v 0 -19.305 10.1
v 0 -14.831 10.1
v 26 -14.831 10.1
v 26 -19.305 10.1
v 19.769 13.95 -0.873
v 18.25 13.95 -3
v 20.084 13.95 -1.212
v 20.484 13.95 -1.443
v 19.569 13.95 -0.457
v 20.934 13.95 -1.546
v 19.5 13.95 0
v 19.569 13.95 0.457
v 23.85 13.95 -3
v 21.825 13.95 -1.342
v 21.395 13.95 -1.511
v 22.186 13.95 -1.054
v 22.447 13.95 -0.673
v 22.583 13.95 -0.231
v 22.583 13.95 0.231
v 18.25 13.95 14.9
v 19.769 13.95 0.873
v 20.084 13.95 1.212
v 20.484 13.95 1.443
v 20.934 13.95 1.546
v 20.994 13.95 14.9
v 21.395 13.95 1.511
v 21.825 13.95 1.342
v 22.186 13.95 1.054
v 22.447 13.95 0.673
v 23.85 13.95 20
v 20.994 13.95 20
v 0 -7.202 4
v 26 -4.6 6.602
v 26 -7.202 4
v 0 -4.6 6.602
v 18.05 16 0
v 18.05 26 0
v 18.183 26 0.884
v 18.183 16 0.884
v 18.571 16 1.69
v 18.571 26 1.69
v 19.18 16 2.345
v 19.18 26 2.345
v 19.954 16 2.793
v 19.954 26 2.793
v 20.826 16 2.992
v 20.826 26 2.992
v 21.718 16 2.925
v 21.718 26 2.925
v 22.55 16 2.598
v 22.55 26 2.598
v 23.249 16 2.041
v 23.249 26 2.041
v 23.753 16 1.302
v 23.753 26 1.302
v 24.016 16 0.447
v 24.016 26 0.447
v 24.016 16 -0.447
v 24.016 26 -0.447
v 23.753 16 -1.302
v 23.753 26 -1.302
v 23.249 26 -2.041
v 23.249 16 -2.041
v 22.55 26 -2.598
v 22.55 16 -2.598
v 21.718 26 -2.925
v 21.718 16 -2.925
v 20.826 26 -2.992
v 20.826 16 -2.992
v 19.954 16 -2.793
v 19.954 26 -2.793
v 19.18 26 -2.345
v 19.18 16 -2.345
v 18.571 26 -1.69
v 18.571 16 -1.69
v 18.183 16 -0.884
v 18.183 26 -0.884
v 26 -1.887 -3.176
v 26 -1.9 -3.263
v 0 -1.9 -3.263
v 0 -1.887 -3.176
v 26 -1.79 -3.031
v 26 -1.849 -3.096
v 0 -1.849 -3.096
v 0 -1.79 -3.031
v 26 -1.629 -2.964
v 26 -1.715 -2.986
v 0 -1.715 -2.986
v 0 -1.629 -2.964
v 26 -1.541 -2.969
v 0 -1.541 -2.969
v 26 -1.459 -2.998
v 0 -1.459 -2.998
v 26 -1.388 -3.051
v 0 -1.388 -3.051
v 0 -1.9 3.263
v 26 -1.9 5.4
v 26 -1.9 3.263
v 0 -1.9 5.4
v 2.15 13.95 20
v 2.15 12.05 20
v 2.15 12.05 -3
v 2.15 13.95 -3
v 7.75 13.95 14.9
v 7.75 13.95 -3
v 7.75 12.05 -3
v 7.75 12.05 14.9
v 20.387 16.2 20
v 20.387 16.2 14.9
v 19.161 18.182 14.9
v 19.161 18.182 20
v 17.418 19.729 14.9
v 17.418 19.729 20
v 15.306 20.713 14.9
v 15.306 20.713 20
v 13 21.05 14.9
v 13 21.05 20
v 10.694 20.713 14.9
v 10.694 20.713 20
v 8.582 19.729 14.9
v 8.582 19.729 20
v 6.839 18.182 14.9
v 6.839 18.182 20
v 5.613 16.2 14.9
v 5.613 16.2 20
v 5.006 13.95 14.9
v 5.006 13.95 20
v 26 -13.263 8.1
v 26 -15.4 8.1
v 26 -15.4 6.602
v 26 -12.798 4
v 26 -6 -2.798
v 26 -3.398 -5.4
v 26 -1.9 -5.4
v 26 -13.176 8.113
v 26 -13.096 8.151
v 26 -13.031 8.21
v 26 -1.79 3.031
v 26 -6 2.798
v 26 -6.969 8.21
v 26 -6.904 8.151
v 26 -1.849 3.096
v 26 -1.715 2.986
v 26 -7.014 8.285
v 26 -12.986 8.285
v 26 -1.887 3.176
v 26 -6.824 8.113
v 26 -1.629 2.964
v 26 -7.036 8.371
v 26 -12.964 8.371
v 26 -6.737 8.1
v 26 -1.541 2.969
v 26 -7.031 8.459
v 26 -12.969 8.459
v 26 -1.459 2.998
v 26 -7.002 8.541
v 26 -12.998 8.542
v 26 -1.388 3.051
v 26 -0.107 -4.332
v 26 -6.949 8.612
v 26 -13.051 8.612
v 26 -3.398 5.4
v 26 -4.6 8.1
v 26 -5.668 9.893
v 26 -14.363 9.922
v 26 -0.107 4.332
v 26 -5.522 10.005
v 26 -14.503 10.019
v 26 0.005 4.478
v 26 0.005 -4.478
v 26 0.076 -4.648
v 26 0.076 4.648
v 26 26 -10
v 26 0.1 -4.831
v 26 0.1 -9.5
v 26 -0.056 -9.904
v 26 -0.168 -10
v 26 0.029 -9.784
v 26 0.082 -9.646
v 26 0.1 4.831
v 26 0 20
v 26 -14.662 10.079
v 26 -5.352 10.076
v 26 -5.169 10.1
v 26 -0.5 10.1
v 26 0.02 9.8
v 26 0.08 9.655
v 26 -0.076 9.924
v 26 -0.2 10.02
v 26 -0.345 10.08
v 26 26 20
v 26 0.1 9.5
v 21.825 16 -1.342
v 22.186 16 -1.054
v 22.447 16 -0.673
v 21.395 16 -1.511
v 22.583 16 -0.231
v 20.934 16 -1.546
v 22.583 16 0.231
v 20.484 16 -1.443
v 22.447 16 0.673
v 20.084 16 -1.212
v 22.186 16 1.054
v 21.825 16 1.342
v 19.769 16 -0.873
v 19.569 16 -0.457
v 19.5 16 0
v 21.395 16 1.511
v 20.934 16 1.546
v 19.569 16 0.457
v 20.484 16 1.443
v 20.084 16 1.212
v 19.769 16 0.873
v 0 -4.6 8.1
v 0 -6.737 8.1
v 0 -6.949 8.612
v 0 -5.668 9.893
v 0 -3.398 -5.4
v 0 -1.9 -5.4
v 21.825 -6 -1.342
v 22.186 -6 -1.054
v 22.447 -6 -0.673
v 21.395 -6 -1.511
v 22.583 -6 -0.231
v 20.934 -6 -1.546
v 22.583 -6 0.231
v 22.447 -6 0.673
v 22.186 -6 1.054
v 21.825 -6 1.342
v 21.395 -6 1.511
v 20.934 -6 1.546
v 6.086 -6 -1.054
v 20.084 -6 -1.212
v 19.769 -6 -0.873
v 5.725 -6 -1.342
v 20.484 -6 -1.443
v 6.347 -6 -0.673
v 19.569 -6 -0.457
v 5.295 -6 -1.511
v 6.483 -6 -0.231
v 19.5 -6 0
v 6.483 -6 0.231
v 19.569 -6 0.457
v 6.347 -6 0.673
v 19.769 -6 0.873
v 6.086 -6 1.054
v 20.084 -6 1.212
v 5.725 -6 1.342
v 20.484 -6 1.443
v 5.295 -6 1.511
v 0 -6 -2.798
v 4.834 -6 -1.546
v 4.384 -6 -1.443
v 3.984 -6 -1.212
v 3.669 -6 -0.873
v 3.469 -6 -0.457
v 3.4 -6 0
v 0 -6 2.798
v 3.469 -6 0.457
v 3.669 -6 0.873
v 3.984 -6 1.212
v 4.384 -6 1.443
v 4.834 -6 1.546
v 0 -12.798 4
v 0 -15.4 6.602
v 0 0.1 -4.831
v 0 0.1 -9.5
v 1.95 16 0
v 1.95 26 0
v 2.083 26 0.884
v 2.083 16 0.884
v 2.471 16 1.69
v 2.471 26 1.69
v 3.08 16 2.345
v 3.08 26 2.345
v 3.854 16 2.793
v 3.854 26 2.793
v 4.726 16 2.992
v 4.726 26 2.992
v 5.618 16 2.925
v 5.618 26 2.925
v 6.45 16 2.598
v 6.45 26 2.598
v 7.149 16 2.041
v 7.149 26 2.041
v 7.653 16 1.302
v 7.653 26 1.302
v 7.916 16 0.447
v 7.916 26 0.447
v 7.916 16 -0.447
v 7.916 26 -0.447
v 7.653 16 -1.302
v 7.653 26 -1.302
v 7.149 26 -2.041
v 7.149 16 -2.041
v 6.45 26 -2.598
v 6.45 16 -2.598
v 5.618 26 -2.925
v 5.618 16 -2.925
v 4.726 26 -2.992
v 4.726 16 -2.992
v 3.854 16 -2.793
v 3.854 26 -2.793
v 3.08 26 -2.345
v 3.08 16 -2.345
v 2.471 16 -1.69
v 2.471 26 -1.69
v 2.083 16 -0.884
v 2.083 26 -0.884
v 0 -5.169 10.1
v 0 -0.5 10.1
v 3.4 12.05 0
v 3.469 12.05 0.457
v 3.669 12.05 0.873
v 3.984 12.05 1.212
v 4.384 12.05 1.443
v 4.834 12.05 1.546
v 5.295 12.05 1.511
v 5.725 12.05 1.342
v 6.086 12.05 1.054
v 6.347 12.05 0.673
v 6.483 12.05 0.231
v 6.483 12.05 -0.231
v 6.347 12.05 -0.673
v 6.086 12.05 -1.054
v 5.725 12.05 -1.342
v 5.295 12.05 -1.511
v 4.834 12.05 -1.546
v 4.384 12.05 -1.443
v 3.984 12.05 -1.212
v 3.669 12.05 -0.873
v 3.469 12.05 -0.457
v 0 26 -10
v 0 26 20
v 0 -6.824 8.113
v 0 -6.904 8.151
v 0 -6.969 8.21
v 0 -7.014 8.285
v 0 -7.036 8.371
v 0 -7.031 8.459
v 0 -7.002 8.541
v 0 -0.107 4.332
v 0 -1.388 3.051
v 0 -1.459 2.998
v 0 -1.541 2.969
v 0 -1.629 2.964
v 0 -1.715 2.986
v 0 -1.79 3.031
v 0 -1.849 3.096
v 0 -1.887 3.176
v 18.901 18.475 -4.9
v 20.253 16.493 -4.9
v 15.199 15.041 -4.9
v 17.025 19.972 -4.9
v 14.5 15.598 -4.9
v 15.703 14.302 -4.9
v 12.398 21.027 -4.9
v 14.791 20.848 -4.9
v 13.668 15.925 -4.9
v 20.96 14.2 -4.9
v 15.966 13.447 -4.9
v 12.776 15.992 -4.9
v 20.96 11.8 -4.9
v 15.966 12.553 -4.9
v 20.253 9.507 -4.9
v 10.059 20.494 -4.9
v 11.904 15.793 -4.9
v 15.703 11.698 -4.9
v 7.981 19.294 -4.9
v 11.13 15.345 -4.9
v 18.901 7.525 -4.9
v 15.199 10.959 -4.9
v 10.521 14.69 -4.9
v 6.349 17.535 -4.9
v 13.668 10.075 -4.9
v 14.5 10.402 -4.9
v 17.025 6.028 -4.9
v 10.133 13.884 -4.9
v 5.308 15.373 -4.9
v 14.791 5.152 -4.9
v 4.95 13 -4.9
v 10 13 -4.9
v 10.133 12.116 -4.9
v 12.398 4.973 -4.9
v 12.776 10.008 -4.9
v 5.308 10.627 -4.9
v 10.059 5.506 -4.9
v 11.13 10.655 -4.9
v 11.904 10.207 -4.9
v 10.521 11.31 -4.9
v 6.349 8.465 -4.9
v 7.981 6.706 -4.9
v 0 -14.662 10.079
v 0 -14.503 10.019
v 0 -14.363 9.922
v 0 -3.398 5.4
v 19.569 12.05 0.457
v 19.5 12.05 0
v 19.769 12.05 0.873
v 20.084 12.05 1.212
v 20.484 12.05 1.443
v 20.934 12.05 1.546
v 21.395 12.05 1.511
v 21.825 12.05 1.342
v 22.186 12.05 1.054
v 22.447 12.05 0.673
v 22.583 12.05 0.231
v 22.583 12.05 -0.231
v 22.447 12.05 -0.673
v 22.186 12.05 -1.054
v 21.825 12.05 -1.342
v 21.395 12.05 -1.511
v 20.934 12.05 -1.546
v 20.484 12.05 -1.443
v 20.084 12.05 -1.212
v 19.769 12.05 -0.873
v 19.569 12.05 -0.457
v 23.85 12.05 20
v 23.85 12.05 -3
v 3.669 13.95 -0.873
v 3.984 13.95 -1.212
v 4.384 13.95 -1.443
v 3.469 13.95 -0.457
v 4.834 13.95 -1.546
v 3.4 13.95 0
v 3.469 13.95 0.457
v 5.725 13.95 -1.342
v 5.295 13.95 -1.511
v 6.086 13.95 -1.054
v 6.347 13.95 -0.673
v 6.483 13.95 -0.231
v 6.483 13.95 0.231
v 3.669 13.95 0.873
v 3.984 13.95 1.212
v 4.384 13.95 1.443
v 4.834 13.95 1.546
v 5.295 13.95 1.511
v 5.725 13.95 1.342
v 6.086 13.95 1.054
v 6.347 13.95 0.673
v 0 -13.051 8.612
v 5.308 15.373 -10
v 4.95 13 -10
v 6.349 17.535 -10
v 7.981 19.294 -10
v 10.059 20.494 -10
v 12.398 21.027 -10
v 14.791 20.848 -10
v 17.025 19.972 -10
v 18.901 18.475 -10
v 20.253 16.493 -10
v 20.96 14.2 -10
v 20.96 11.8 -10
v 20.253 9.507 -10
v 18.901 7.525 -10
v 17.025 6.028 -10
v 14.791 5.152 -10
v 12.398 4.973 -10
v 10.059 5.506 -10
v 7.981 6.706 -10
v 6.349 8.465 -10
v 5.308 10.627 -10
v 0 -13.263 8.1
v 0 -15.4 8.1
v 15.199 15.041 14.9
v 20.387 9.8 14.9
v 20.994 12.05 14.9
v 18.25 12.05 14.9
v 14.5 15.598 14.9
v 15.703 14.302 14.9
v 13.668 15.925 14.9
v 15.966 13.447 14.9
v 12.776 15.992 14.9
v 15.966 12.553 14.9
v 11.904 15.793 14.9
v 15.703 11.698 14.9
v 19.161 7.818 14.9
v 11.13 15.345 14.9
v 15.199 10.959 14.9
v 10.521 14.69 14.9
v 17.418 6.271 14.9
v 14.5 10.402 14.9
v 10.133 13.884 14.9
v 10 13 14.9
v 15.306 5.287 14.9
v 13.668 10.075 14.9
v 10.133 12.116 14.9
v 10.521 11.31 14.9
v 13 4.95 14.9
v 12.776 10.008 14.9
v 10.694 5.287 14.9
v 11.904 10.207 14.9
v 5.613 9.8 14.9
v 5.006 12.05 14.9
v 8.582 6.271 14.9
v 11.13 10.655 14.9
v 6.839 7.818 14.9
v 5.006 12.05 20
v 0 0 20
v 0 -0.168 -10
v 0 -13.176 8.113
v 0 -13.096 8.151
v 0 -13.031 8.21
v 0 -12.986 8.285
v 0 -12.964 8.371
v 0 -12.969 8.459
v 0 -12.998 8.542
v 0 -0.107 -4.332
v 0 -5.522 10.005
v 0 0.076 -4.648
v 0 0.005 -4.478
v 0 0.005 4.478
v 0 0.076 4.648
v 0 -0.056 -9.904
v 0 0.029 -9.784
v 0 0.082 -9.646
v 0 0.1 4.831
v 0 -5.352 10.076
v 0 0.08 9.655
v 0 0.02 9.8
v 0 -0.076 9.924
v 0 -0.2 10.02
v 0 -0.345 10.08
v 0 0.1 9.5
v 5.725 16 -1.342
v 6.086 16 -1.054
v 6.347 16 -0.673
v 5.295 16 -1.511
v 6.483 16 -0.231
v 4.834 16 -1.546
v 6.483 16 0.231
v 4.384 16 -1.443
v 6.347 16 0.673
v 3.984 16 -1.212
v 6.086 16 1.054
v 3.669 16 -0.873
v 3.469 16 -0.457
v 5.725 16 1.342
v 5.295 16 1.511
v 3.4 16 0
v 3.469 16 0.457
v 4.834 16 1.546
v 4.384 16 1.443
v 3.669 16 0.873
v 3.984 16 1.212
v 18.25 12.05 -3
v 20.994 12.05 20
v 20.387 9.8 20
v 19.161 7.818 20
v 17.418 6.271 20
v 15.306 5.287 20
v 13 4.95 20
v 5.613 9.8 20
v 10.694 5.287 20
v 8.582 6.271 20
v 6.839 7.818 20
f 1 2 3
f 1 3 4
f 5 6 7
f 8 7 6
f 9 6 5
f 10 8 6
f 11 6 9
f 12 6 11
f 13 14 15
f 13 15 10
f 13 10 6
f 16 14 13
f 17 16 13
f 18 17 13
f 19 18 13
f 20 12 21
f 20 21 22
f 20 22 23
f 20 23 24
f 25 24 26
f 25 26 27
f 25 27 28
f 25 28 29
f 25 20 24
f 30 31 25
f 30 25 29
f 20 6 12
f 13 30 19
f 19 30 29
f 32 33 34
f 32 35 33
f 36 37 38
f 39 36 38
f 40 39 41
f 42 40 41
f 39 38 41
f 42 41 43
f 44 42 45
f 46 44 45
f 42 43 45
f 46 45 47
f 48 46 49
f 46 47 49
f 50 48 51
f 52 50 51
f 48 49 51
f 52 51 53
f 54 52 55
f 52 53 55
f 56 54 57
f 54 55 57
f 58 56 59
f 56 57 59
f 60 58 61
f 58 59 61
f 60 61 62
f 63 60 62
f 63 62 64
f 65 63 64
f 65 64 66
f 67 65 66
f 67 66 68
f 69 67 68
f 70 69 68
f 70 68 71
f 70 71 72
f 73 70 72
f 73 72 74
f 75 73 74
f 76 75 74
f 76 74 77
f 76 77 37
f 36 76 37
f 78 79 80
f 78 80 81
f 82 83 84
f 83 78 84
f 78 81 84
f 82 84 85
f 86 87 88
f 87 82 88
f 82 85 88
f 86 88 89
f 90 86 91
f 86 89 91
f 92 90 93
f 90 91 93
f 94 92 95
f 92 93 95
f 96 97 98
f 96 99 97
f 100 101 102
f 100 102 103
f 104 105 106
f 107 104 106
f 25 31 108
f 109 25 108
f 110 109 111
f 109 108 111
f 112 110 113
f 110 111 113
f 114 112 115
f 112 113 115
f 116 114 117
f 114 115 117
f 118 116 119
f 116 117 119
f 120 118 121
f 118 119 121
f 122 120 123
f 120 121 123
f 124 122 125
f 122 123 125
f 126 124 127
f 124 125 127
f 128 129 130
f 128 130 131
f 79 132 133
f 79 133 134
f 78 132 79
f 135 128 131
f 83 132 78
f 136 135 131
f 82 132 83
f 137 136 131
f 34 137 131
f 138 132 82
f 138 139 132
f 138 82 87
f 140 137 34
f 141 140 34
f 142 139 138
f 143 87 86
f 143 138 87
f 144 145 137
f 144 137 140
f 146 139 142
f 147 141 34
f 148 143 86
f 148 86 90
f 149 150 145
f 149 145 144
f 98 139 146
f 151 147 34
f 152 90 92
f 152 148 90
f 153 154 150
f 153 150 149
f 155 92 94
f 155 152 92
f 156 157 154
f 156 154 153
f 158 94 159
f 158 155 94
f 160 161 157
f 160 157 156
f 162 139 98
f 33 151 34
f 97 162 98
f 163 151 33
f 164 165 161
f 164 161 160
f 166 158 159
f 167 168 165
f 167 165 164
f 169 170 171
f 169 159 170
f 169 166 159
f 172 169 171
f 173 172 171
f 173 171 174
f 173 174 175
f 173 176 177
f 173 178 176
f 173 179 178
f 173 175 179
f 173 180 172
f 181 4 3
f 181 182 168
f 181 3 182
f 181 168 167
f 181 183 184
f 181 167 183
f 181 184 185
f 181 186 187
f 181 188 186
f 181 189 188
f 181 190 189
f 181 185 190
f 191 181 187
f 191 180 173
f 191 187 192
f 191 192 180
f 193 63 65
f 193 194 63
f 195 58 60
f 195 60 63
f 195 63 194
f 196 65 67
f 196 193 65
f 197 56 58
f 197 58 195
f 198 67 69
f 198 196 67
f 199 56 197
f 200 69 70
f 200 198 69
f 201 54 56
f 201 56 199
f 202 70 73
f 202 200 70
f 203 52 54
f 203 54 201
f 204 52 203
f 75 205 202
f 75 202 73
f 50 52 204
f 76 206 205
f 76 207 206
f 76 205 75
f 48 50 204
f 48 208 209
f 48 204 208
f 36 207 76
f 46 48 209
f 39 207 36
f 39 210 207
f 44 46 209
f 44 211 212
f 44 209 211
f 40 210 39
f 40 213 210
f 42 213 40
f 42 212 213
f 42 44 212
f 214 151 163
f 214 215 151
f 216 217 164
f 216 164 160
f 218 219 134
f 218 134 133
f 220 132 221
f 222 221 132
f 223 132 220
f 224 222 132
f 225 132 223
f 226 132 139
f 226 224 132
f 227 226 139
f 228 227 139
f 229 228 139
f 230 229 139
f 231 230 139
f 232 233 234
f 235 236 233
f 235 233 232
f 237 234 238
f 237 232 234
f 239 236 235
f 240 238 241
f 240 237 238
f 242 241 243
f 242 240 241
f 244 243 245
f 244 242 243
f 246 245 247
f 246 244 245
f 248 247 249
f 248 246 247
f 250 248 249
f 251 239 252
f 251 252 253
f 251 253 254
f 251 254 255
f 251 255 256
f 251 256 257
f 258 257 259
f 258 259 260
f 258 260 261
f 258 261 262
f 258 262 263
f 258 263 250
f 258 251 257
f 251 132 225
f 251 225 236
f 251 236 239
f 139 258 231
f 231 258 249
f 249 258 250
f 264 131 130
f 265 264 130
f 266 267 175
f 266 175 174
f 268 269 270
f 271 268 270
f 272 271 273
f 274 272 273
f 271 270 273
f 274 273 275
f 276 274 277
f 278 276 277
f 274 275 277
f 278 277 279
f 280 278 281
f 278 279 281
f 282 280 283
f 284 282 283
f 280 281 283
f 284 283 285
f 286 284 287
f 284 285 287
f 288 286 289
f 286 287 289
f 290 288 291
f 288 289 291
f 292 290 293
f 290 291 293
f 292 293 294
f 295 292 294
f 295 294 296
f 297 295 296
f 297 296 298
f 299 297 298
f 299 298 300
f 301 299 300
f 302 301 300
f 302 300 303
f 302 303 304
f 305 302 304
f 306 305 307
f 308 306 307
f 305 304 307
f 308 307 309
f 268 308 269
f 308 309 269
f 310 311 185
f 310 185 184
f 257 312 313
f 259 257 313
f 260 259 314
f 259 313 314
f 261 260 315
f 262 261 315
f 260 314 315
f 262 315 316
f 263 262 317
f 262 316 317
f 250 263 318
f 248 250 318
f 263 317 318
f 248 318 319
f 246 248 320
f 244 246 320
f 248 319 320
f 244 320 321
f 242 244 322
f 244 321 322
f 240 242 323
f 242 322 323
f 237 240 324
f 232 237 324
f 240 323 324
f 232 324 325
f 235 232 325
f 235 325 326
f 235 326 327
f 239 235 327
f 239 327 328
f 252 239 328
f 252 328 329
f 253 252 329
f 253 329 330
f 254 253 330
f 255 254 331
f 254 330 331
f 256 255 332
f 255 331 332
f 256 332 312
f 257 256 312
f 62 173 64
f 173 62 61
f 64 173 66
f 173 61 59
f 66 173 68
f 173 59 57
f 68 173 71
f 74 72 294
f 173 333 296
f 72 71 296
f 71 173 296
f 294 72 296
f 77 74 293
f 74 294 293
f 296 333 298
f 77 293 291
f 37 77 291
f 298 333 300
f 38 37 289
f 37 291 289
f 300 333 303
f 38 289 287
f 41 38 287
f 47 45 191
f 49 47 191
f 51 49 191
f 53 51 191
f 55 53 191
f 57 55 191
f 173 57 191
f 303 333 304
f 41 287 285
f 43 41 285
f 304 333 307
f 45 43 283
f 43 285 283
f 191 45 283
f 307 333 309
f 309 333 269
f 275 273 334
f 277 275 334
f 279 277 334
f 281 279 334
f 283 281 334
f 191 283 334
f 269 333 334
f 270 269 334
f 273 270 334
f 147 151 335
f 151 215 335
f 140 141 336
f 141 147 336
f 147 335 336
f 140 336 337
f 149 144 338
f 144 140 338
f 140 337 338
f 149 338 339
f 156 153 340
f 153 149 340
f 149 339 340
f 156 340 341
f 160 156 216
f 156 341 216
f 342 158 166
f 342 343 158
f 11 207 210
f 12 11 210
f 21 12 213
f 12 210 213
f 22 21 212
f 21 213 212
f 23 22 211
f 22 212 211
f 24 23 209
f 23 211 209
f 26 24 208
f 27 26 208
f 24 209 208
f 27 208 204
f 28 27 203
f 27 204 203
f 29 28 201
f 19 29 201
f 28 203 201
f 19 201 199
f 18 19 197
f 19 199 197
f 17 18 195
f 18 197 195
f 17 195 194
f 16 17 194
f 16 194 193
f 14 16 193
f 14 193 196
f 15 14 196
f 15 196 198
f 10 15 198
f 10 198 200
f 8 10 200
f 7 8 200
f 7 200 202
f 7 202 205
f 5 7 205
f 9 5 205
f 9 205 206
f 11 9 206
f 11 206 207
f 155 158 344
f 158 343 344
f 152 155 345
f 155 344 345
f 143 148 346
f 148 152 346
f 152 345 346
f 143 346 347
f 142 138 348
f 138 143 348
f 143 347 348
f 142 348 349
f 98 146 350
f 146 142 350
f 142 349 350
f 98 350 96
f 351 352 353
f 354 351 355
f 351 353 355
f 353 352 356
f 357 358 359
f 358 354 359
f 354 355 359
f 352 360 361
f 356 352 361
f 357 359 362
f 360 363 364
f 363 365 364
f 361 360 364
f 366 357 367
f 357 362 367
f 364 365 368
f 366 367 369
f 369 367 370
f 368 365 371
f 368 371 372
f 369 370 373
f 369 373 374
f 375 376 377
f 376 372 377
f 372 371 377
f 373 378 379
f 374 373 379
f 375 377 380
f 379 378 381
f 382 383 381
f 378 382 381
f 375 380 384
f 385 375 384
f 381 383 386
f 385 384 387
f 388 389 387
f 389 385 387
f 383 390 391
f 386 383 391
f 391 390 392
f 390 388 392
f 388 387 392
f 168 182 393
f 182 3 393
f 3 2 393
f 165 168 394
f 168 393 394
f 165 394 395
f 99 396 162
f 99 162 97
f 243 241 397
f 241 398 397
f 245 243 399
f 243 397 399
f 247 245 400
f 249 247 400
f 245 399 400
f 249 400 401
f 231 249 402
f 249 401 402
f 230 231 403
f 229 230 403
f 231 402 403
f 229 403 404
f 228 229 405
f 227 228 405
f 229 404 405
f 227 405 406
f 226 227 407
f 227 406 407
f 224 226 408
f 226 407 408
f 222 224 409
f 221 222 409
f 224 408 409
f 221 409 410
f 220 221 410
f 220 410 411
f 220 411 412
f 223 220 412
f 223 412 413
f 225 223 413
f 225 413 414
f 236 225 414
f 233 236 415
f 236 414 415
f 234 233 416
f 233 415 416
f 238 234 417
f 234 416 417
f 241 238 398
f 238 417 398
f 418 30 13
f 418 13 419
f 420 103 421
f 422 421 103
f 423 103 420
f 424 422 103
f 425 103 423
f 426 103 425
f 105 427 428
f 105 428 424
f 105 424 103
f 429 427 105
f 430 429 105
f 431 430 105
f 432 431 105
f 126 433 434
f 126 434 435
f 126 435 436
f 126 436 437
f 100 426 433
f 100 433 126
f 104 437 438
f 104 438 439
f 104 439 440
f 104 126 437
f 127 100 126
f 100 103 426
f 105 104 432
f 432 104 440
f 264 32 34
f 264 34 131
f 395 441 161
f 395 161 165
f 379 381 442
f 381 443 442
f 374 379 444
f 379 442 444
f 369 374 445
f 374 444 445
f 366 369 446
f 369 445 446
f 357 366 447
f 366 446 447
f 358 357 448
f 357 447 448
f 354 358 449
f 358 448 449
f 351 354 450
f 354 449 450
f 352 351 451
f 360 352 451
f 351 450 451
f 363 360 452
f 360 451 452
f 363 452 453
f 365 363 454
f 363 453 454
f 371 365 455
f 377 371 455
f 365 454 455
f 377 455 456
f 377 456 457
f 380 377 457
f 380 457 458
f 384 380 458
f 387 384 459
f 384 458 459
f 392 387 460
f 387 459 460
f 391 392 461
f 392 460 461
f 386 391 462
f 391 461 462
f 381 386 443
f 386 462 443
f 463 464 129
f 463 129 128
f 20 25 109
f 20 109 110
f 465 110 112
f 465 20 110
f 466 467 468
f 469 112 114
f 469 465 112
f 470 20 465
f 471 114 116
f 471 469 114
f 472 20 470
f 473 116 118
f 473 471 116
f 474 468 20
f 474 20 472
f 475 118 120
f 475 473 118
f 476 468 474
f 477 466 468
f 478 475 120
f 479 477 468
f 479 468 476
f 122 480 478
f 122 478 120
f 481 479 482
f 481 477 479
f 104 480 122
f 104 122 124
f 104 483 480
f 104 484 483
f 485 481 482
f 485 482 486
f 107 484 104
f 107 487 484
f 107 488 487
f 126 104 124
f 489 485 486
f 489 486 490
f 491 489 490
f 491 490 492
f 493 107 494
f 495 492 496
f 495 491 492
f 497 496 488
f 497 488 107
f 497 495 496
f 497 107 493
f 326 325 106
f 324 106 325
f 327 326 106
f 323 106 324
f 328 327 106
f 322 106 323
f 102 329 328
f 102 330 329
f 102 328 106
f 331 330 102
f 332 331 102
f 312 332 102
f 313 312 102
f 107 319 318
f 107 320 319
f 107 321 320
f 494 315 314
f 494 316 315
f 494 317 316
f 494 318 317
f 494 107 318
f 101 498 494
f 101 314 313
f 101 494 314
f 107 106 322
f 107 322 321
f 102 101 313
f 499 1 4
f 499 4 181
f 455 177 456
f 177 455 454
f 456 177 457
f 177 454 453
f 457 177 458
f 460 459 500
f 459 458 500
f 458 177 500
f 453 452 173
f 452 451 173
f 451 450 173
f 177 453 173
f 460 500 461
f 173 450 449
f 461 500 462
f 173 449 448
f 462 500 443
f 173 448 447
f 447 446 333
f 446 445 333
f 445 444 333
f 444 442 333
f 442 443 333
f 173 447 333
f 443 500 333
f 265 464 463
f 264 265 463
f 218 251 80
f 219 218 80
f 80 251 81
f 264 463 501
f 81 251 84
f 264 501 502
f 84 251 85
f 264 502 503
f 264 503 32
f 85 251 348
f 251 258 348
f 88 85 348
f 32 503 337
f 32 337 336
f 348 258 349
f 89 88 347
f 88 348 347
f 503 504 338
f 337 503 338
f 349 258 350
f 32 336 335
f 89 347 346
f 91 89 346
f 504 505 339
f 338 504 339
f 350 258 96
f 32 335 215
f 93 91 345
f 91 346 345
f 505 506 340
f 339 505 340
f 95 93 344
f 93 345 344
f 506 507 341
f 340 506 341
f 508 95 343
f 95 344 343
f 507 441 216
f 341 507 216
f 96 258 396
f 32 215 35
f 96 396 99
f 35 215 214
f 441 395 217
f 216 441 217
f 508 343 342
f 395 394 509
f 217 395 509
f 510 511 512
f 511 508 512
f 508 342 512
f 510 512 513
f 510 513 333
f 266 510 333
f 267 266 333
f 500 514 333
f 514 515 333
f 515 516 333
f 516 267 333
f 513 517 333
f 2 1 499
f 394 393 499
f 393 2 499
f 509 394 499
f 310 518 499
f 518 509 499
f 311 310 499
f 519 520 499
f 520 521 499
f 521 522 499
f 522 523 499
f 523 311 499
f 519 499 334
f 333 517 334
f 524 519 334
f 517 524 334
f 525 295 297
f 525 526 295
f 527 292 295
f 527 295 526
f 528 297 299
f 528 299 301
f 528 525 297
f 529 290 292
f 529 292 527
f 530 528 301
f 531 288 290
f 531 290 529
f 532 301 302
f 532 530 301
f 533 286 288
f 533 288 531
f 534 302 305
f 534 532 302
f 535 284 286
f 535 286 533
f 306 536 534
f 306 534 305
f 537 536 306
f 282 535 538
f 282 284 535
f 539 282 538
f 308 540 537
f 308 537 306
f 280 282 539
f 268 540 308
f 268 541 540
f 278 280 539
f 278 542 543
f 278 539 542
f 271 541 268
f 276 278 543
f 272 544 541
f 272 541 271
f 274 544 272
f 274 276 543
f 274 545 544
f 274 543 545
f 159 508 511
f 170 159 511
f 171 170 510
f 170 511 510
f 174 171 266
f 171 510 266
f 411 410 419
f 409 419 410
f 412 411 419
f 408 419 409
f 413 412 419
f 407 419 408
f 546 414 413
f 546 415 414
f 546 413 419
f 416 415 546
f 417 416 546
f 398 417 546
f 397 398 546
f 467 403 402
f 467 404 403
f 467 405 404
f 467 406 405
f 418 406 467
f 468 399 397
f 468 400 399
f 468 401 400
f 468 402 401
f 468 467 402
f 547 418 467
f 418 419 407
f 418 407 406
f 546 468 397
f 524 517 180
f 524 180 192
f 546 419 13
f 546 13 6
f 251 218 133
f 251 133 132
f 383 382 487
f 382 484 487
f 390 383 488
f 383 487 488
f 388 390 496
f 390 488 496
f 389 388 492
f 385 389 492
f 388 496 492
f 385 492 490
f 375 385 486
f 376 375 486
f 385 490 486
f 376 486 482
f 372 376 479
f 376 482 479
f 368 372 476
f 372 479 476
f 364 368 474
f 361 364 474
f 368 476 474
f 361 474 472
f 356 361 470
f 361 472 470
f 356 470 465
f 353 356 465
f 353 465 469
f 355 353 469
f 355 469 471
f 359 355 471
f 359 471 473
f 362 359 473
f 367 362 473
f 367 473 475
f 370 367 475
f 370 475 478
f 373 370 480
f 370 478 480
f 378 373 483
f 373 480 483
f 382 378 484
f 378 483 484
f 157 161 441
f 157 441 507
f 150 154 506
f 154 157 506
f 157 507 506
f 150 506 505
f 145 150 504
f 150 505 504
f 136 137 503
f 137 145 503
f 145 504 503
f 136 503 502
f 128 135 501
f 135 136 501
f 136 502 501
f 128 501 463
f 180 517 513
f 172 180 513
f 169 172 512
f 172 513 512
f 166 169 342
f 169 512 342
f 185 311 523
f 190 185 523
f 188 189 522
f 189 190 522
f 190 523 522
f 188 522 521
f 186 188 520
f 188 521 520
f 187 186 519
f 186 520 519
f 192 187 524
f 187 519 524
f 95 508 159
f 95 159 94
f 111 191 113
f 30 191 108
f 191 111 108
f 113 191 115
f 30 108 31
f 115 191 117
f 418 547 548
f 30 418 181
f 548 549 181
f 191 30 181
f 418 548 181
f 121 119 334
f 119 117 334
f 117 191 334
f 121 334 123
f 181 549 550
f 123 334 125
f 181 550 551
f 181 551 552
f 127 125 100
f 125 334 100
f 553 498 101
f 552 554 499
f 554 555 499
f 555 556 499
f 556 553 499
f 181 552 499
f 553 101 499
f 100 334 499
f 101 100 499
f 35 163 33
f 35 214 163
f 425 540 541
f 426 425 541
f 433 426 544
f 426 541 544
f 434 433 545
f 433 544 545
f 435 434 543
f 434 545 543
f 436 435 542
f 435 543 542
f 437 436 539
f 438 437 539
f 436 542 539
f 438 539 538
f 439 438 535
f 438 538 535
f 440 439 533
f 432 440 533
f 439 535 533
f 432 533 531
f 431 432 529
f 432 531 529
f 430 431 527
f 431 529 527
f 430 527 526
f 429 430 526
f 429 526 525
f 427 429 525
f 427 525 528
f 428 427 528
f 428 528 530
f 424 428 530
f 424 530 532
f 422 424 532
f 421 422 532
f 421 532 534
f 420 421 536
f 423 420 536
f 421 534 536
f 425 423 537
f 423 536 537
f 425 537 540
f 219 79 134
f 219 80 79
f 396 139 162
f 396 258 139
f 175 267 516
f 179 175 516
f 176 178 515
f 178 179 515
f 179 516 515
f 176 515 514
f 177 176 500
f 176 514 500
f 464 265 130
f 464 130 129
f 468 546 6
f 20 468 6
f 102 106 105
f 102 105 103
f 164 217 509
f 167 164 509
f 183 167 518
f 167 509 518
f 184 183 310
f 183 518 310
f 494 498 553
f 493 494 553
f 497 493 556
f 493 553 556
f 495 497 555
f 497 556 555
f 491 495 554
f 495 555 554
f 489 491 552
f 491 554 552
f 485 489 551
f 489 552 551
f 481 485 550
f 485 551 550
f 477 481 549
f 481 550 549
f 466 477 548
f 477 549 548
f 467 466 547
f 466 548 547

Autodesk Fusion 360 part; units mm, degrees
sketch "Sketch1" plane through (0, 0, 0) normal (1, 0, 0) x (0, 1, 0)
  line L0 (-3.4393, 5.5) -> (-1.8, 5.5)
  line L1 (-12.8393, 3.9) -> (-15.5, 6.5607)
  line L2 (-7.1607, 3.9) -> (-12.8393, 3.9)
  line L3 (-4.5, 6.5607) -> (-7.1607, 3.9)
  line L4 (-4.5, -8.2) -> (-6.7372, -8.2)
  line L5 (-5.5978, 9.8222) -> (-6.8786, 8.5414)
  line L6 (-1.8, 5.5) -> (-1.8, 3.2628)
  line L7 (-19.8494, 4.4312) -> (-18.5414, 3.1214)
  line L8 (-15.5, 8.2) -> (-13.2628, 8.2)
  arc A0 (-5.1686, 10) -> (-5.5978, 9.8222) centre (-5.1686, 9.3929) ccw
  circle A1 centre (-10, 0) radius 2.1
  line L9 (-0.5, 10) -> (-5.1686, 10)
  line L10 (-6.1, 2.8393) -> (-3.4393, 5.5)
  line L11 (-14.8314, 10) -> (-19.5, 10)
  line L12 (0, -9.5) -> (0, -4.8314)
  line L13 (-15.5, -8.2) -> (-15.5, -6.5607)
  line L14 (-15.5, -6.5607) -> (-12.8393, -3.9)
  line L15 (-14.4022, -9.8222) -> (-13.1214, -8.5414)
  line L16 (-19.9987, -4.7917) -> (-20, -9.5)
  line L17 (-18.5414, -3.1214) -> (-19.8222, -4.4022)
  line L18 (-6.8786, -8.5414) -> (-5.7664, -9.6536)
  arc A2 (-19.8222, -4.4022) -> (-19.9987, -4.7917) centre (-19.3929, -4.8314) ccw
  line L19 (-13.9, -2.8393) -> (-16.5607, -5.5)
  line L20 (-16.5607, -5.5) -> (-18.2, -5.5)
  arc A3 (-0.5, -10) -> (0, -9.5) centre (-0.5, -9.5) ccw
  arc A4 (-18.2, -3.2628) -> (-18.5414, -3.1214) centre (-18.4, -3.2628) ccw
  line L21 (-13.2628, -8.2) -> (-15.5, -8.2)
  line L22 (-0.1778, -4.4022) -> (-1.4586, -3.1214)
  arc A5 (-5.7664, -9.6536) -> (-5.1686, -10) centre (-5.1163, -9.2207) ccw
  arc A6 (-20, -9.5) -> (-19.5, -10) centre (-19.5, -9.5) ccw
  line L23 (-1.8, -5.5) -> (-3.4393, -5.5)
  line L24 (-5.1686, -10) -> (-0.5, -10)
  line L25 (-3.4393, -5.5) -> (-6.1, -2.8393)
  line L26 (-12.8393, -3.9) -> (-7.1607, -3.9)
  line L27 (-4.5, -6.5607) -> (-4.5, -8.2)
  arc A7 (0, -4.8314) -> (-0.1778, -4.4022) centre (-0.6071, -4.8314) ccw
  arc A8 (-14.8314, -10) -> (-14.4022, -9.8222) centre (-14.8314, -9.3929) ccw
  line L28 (-18.2, -5.5) -> (-18.2, -3.2628)
  arc A9 (-13.1214, -8.5414) -> (-13.2628, -8.2) centre (-13.2628, -8.4) ccw
  arc A10 (-20, 4.9) -> (-19.8494, 4.4312) centre (-19.3734, 4.8428) ccw
  arc A11 (-13.2628, 8.2) -> (-13.1214, 8.5414) centre (-13.2628, 8.4) ccw
  line L29 (-13.1214, 8.5414) -> (-14.4312, 9.8494)
  arc A12 (-6.8786, 8.5414) -> (-6.7372, 8.2) centre (-6.7372, 8.4) ccw
  arc A13 (-18.5414, 3.1214) -> (-18.2, 3.2628) centre (-18.4, 3.2628) ccw
  arc A14 (-14.4312, 9.8494) -> (-14.8314, 10) centre (-14.8314, 9.3929) ccw
  line L30 (-1.4586, 3.1214) -> (-0.1778, 4.4022)
  line L31 (-15.5, 6.5607) -> (-15.5, 8.2)
  arc A15 (-19.5, 10) -> (-20, 9.5) centre (-19.5, 9.5) ccw
  arc A16 (0, 9.5) -> (-0.5, 10) centre (-0.5, 9.5) ccw
  line L32 (-20, 9.5) -> (-20, 4.9)
  line L33 (-19.5, -10) -> (-14.8314, -10)
  line L34 (-7.1607, -3.9) -> (-4.5, -6.5607)
  line L35 (-1.8, -3.2628) -> (-1.8, -5.5)
  arc A17 (-1.4586, -3.1214) -> (-1.8, -3.2628) centre (-1.6, -3.2628) ccw
  arc A18 (-6.7372, -8.2) -> (-6.8786, -8.5414) centre (-6.7372, -8.4) ccw
  arc A19 (-1.8, 3.2628) -> (-1.4586, 3.1214) centre (-1.6, 3.2628) ccw
  line L36 (0, 4.8314) -> (0, 9.5)
  line L37 (-18.2, 5.5) -> (-16.5607, 5.5)
  line L38 (-13.9, 2.8393) -> (-13.9, -2.8393)
  line L39 (-6.1, -2.8393) -> (-6.1, 2.8393)
  line L40 (-18.2, 3.2628) -> (-18.2, 5.5)
  arc A20 (-0.1778, 4.4022) -> (0, 4.8314) centre (-0.6071, 4.8314) ccw
  line L41 (-4.5, 8.2) -> (-4.5, 6.5607)
  line L42 (-6.7372, 8.2) -> (-4.5, 8.2)
  line L43 (-16.5607, 5.5) -> (-13.9, 2.8393)
  line L44 (-12.7979, 4) -> (-15.4, 6.6021)
  line L45 (-15.4, 6.6021) -> (-15.4, 8.1)
  line L46 (-15.4, 8.1) -> (-13.2628, 8.1)
  arc A21 (-13.2628, 8.1) -> (-13.0509, 8.6124) centre (-13.2628, 8.4) ccw
  line L47 (-13.0509, 8.6124) -> (-14.3627, 9.9223)
  arc A22 (-14.3627, 9.9223) -> (-14.8314, 10.1) centre (-14.8314, 9.3929) ccw
  line L48 (-14.8314, 10.1) -> (-19.5, 10.1)
  arc A23 (-19.5, 10.1) -> (-20.1, 9.5) centre (-19.5, 9.5) ccw
  line L49 (-20.1, 9.5) -> (-20.1, 4.9044)
  arc A24 (-20.1, 4.9044) -> (-19.9226, 4.363) centre (-19.3734, 4.8428) ccw
  line L50 (-19.9226, 4.363) -> (-18.6124, 3.0509)
  arc A25 (-18.6124, 3.0509) -> (-18.1, 3.2628) centre (-18.4, 3.2628) ccw
  line L51 (-18.1, 3.2628) -> (-18.1, 5.4)
  line L52 (-18.1, 5.4) -> (-16.6021, 5.4)
  line L53 (-16.6021, 5.4) -> (-14, 2.7979)
  line L54 (-14, 2.7979) -> (-14, -2.7979)
  line L55 (-14, -2.7979) -> (-16.6021, -5.4)
  line L56 (-16.6021, -5.4) -> (-18.1, -5.4)
  line L57 (-18.1, -5.4) -> (-18.1, -3.2628)
  arc A26 (-18.1, -3.2628) -> (-18.6121, -3.0507) centre (-18.4, -3.2628) ccw
  line L58 (-18.6121, -3.0507) -> (-19.8929, -4.3315)
  arc A27 (-19.8929, -4.3315) -> (-20.0987, -4.7886) centre (-19.3929, -4.8314) ccw
  line L59 (-20.0987, -4.7886) -> (-20.1, -9.4997)
  arc A28 (-20.1, -9.4997) -> (-19.5, -10.1) centre (-19.5, -9.5) ccw
  line L60 (-19.5, -10.1) -> (-14.8314, -10.1)
  arc A29 (-14.8314, -10.1) -> (-14.3315, -9.8929) centre (-14.8314, -9.3929) ccw
  line L61 (-14.3315, -9.8929) -> (-13.0507, -8.6121)
  arc A30 (-13.0507, -8.6121) -> (-13.2628, -8.1) centre (-13.2628, -8.4) ccw
  line L62 (-13.2628, -8.1) -> (-15.4, -8.1)
  line L63 (-15.4, -8.1) -> (-15.4, -6.6021)
  line L64 (-15.4, -6.6021) -> (-12.7979, -4)
  line L65 (-12.7979, -4) -> (-7.2021, -4)
  line L66 (-7.2021, -4) -> (-4.6, -6.6021)
  line L67 (-4.6, -6.6021) -> (-4.6, -8.1)
  line L68 (-4.6, -8.1) -> (-6.7372, -8.1)
  arc A31 (-6.7372, -8.1) -> (-6.9493, -8.6121) centre (-6.7372, -8.4) ccw
  line L69 (-6.9493, -8.6121) -> (-5.8439, -9.7175)
  arc A32 (-5.8439, -9.7175) -> (-5.1718, -10.1) centre (-5.1163, -9.2207) ccw
  line L70 (-5.1718, -10.1) -> (-0.5, -10.1)
  arc A33 (-0.5, -10.1) -> (0.1, -9.5) centre (-0.5, -9.5) ccw
  line L71 (0.1, -9.5) -> (0.1, -4.8314)
  arc A34 (0.1, -4.8314) -> (-0.1071, -4.3315) centre (-0.6071, -4.8314) ccw
  line L72 (-0.1071, -4.3315) -> (-1.3879, -3.0507)
  arc A35 (-1.3879, -3.0507) -> (-1.9, -3.2628) centre (-1.6, -3.2628) ccw
  line L73 (-1.9, -3.2628) -> (-1.9, -5.4)
  line L74 (-1.9, -5.4) -> (-3.3979, -5.4)
  line L75 (-3.3979, -5.4) -> (-6, -2.7979)
  line L76 (-6, -2.7979) -> (-6, 2.7979)
  line L77 (-6, 2.7979) -> (-3.3979, 5.4)
  line L78 (-3.3979, 5.4) -> (-1.9, 5.4)
  line L79 (-1.9, 5.4) -> (-1.9, 3.2628)
  arc A36 (-1.9, 3.2628) -> (-1.3879, 3.0507) centre (-1.6, 3.2628) ccw
  line L80 (-1.3879, 3.0507) -> (-0.1071, 4.3315)
  arc A37 (-0.1071, 4.3315) -> (0.1, 4.8314) centre (-0.6071, 4.8314) ccw
  line L81 (0.1, 4.8314) -> (0.1, 9.5)
  arc A38 (0.1, 9.5) -> (-0.5, 10.1) centre (-0.5, 9.5) ccw
  line L82 (-0.5, 10.1) -> (-5.1686, 10.1)
  arc A39 (-5.1686, 10.1) -> (-5.6685, 9.8929) centre (-5.1686, 9.3929) ccw
  line L83 (-5.6685, 9.8929) -> (-6.9493, 8.6121)
  arc A40 (-6.9493, 8.6121) -> (-6.7372, 8.1) centre (-6.7372, 8.4) ccw
  line L84 (-6.7372, 8.1) -> (-4.6, 8.1)
  line L85 (-4.6, 8.1) -> (-4.6, 6.6021)
  line L86 (-4.6, 6.6021) -> (-7.2021, 4)
  line L87 (-7.2021, 4) -> (-12.7979, 4)
  line L88 (0, -15) -> (0, 15) construction
  line L89 (-0.5, -10) -> (0, -10)
  line L90 (0, -10) -> (26, -10)
  line L91 (26, -10) -> (26, 20)
  line L92 (26, 20) -> (0, 20)
  line L93 (-19.5, 10) -> (0, 20)
  line L94 (13, 20) -> (13, -10) construction
  point P0 (-10, 0)
  dimension "d1" = 0.1
extrude "Extrude1" add sketch "Sketch1" along normal blind 26 contours L44 L45 L46 A21 L47 A22 L48 A33 L71 A34 L72 A35 L73 L74 L75 L76 L77 L78 L79 A36 L80 A37 L81 A38 L82 A39 L83 A40 L84 L85 L86 L87 L89 L90 L91 L92 L93
sketch "Sketch2" plane through (0, 0, 20) normal (0, 0, 1) x (-1, 0, 0)
  line L0 (0, -26) -> (0, 0)
  line L1 (0, 0) -> (-26, 0)
  line L2 (-26, 0) -> (-26, -26)
  line L3 (-26, -26) -> (0, -26)
  circle A0 centre (-13, -13) radius 8.05
  circle A1 centre (-13, -13) radius 3
  line L4 (0, -13) -> (-26, -13) construction
  line L5 (-2.15, -13.95) -> (-7.75, -13.95)
  line L6 (-7.75, -13.95) -> (-7.75, -12.05)
  line L7 (-7.75, -12.05) -> (-2.15, -12.05)
  line L8 (-2.15, -12.05) -> (-2.15, -13.95)
  line L9 (-2.15, -13.95) -> (-7.75, -12.05) construction
  line L10 (-7.75, -13.95) -> (-2.15, -12.05) construction
  line L11 (-18.25, -13.95) -> (-23.85, -13.95)
  line L12 (-23.85, -13.95) -> (-23.85, -12.05)
  line L13 (-23.85, -12.05) -> (-18.25, -12.05)
  line L14 (-18.25, -12.05) -> (-18.25, -13.95)
  line L15 (-18.25, -13.95) -> (-23.85, -12.05) construction
  line L16 (-23.85, -13.95) -> (-18.25, -12.05) construction
  point P0 (-4.95, -13)
  point P1 (-21.05, -13)
  dimension "d9" = 16.1
  dimension "d15" = 6
  dimension "d18" = 5.6
  dimension "d19" = 1.9
  dimension "d20" = 5.6
  dimension "d21" = 1.9
extrude "Extrude2" cut sketch "Sketch2" against normal blind 5.1 contours A0 L5 L6 L7 | A0 L5 L6 L7 L11 L13 L14 | A0 L11 L13 L14 | A1
extrude "Extrude3" cut sketch "Sketch2" along normal blind 5.1 from surface at -30 contours A0 L5 L6 L7 | A0 L5 L6 L7 L11 L13 L14 | A0 L11 L13 L14 | A1
extrude "Extrude4" cut sketch "Sketch2" against normal blind 30 contours A1
sketch "Sketch3" plane through (0, 26, 0) normal (0, 1, 0) x (-1, 0, 0)
  line L0 (0, -10) -> (0, 20)
  line L1 (0, 20) -> (-26, 20)
  line L2 (-26, 20) -> (-26, -10)
  line L3 (-26, -10) -> (0, -10)
  line L4 (-27, 0) -> (1, 0) construction
  circle A0 centre (-13, 0) radius 8.05 construction
  circle A1 centre (-21.05, 0) radius 3
  circle A2 centre (-21.05, 0) radius 1.55
  circle A3 centre (-4.95, 0) radius 3
  circle A4 centre (-4.95, 0) radius 1.55
  dimension "d22" = 16.1
  dimension "d23" = 6
  dimension "d24" = 3.1
  dimension "d25" = 6
  dimension "d26" = 3.1
extrude "Extrude5" cut sketch "Sketch3" against normal blind 33 contours A2 | A4
extrude "Extrude6" cut sketch "Sketch3" against normal blind 10 contours A1 | A3
extrude "Extrude7" cut sketch "Sketch2" against normal blind 23 contours A0 L5 L6 L7 | A0 L5 L7 L8 | A0 L11 L13 L14 | A0 L11 L12 L13
